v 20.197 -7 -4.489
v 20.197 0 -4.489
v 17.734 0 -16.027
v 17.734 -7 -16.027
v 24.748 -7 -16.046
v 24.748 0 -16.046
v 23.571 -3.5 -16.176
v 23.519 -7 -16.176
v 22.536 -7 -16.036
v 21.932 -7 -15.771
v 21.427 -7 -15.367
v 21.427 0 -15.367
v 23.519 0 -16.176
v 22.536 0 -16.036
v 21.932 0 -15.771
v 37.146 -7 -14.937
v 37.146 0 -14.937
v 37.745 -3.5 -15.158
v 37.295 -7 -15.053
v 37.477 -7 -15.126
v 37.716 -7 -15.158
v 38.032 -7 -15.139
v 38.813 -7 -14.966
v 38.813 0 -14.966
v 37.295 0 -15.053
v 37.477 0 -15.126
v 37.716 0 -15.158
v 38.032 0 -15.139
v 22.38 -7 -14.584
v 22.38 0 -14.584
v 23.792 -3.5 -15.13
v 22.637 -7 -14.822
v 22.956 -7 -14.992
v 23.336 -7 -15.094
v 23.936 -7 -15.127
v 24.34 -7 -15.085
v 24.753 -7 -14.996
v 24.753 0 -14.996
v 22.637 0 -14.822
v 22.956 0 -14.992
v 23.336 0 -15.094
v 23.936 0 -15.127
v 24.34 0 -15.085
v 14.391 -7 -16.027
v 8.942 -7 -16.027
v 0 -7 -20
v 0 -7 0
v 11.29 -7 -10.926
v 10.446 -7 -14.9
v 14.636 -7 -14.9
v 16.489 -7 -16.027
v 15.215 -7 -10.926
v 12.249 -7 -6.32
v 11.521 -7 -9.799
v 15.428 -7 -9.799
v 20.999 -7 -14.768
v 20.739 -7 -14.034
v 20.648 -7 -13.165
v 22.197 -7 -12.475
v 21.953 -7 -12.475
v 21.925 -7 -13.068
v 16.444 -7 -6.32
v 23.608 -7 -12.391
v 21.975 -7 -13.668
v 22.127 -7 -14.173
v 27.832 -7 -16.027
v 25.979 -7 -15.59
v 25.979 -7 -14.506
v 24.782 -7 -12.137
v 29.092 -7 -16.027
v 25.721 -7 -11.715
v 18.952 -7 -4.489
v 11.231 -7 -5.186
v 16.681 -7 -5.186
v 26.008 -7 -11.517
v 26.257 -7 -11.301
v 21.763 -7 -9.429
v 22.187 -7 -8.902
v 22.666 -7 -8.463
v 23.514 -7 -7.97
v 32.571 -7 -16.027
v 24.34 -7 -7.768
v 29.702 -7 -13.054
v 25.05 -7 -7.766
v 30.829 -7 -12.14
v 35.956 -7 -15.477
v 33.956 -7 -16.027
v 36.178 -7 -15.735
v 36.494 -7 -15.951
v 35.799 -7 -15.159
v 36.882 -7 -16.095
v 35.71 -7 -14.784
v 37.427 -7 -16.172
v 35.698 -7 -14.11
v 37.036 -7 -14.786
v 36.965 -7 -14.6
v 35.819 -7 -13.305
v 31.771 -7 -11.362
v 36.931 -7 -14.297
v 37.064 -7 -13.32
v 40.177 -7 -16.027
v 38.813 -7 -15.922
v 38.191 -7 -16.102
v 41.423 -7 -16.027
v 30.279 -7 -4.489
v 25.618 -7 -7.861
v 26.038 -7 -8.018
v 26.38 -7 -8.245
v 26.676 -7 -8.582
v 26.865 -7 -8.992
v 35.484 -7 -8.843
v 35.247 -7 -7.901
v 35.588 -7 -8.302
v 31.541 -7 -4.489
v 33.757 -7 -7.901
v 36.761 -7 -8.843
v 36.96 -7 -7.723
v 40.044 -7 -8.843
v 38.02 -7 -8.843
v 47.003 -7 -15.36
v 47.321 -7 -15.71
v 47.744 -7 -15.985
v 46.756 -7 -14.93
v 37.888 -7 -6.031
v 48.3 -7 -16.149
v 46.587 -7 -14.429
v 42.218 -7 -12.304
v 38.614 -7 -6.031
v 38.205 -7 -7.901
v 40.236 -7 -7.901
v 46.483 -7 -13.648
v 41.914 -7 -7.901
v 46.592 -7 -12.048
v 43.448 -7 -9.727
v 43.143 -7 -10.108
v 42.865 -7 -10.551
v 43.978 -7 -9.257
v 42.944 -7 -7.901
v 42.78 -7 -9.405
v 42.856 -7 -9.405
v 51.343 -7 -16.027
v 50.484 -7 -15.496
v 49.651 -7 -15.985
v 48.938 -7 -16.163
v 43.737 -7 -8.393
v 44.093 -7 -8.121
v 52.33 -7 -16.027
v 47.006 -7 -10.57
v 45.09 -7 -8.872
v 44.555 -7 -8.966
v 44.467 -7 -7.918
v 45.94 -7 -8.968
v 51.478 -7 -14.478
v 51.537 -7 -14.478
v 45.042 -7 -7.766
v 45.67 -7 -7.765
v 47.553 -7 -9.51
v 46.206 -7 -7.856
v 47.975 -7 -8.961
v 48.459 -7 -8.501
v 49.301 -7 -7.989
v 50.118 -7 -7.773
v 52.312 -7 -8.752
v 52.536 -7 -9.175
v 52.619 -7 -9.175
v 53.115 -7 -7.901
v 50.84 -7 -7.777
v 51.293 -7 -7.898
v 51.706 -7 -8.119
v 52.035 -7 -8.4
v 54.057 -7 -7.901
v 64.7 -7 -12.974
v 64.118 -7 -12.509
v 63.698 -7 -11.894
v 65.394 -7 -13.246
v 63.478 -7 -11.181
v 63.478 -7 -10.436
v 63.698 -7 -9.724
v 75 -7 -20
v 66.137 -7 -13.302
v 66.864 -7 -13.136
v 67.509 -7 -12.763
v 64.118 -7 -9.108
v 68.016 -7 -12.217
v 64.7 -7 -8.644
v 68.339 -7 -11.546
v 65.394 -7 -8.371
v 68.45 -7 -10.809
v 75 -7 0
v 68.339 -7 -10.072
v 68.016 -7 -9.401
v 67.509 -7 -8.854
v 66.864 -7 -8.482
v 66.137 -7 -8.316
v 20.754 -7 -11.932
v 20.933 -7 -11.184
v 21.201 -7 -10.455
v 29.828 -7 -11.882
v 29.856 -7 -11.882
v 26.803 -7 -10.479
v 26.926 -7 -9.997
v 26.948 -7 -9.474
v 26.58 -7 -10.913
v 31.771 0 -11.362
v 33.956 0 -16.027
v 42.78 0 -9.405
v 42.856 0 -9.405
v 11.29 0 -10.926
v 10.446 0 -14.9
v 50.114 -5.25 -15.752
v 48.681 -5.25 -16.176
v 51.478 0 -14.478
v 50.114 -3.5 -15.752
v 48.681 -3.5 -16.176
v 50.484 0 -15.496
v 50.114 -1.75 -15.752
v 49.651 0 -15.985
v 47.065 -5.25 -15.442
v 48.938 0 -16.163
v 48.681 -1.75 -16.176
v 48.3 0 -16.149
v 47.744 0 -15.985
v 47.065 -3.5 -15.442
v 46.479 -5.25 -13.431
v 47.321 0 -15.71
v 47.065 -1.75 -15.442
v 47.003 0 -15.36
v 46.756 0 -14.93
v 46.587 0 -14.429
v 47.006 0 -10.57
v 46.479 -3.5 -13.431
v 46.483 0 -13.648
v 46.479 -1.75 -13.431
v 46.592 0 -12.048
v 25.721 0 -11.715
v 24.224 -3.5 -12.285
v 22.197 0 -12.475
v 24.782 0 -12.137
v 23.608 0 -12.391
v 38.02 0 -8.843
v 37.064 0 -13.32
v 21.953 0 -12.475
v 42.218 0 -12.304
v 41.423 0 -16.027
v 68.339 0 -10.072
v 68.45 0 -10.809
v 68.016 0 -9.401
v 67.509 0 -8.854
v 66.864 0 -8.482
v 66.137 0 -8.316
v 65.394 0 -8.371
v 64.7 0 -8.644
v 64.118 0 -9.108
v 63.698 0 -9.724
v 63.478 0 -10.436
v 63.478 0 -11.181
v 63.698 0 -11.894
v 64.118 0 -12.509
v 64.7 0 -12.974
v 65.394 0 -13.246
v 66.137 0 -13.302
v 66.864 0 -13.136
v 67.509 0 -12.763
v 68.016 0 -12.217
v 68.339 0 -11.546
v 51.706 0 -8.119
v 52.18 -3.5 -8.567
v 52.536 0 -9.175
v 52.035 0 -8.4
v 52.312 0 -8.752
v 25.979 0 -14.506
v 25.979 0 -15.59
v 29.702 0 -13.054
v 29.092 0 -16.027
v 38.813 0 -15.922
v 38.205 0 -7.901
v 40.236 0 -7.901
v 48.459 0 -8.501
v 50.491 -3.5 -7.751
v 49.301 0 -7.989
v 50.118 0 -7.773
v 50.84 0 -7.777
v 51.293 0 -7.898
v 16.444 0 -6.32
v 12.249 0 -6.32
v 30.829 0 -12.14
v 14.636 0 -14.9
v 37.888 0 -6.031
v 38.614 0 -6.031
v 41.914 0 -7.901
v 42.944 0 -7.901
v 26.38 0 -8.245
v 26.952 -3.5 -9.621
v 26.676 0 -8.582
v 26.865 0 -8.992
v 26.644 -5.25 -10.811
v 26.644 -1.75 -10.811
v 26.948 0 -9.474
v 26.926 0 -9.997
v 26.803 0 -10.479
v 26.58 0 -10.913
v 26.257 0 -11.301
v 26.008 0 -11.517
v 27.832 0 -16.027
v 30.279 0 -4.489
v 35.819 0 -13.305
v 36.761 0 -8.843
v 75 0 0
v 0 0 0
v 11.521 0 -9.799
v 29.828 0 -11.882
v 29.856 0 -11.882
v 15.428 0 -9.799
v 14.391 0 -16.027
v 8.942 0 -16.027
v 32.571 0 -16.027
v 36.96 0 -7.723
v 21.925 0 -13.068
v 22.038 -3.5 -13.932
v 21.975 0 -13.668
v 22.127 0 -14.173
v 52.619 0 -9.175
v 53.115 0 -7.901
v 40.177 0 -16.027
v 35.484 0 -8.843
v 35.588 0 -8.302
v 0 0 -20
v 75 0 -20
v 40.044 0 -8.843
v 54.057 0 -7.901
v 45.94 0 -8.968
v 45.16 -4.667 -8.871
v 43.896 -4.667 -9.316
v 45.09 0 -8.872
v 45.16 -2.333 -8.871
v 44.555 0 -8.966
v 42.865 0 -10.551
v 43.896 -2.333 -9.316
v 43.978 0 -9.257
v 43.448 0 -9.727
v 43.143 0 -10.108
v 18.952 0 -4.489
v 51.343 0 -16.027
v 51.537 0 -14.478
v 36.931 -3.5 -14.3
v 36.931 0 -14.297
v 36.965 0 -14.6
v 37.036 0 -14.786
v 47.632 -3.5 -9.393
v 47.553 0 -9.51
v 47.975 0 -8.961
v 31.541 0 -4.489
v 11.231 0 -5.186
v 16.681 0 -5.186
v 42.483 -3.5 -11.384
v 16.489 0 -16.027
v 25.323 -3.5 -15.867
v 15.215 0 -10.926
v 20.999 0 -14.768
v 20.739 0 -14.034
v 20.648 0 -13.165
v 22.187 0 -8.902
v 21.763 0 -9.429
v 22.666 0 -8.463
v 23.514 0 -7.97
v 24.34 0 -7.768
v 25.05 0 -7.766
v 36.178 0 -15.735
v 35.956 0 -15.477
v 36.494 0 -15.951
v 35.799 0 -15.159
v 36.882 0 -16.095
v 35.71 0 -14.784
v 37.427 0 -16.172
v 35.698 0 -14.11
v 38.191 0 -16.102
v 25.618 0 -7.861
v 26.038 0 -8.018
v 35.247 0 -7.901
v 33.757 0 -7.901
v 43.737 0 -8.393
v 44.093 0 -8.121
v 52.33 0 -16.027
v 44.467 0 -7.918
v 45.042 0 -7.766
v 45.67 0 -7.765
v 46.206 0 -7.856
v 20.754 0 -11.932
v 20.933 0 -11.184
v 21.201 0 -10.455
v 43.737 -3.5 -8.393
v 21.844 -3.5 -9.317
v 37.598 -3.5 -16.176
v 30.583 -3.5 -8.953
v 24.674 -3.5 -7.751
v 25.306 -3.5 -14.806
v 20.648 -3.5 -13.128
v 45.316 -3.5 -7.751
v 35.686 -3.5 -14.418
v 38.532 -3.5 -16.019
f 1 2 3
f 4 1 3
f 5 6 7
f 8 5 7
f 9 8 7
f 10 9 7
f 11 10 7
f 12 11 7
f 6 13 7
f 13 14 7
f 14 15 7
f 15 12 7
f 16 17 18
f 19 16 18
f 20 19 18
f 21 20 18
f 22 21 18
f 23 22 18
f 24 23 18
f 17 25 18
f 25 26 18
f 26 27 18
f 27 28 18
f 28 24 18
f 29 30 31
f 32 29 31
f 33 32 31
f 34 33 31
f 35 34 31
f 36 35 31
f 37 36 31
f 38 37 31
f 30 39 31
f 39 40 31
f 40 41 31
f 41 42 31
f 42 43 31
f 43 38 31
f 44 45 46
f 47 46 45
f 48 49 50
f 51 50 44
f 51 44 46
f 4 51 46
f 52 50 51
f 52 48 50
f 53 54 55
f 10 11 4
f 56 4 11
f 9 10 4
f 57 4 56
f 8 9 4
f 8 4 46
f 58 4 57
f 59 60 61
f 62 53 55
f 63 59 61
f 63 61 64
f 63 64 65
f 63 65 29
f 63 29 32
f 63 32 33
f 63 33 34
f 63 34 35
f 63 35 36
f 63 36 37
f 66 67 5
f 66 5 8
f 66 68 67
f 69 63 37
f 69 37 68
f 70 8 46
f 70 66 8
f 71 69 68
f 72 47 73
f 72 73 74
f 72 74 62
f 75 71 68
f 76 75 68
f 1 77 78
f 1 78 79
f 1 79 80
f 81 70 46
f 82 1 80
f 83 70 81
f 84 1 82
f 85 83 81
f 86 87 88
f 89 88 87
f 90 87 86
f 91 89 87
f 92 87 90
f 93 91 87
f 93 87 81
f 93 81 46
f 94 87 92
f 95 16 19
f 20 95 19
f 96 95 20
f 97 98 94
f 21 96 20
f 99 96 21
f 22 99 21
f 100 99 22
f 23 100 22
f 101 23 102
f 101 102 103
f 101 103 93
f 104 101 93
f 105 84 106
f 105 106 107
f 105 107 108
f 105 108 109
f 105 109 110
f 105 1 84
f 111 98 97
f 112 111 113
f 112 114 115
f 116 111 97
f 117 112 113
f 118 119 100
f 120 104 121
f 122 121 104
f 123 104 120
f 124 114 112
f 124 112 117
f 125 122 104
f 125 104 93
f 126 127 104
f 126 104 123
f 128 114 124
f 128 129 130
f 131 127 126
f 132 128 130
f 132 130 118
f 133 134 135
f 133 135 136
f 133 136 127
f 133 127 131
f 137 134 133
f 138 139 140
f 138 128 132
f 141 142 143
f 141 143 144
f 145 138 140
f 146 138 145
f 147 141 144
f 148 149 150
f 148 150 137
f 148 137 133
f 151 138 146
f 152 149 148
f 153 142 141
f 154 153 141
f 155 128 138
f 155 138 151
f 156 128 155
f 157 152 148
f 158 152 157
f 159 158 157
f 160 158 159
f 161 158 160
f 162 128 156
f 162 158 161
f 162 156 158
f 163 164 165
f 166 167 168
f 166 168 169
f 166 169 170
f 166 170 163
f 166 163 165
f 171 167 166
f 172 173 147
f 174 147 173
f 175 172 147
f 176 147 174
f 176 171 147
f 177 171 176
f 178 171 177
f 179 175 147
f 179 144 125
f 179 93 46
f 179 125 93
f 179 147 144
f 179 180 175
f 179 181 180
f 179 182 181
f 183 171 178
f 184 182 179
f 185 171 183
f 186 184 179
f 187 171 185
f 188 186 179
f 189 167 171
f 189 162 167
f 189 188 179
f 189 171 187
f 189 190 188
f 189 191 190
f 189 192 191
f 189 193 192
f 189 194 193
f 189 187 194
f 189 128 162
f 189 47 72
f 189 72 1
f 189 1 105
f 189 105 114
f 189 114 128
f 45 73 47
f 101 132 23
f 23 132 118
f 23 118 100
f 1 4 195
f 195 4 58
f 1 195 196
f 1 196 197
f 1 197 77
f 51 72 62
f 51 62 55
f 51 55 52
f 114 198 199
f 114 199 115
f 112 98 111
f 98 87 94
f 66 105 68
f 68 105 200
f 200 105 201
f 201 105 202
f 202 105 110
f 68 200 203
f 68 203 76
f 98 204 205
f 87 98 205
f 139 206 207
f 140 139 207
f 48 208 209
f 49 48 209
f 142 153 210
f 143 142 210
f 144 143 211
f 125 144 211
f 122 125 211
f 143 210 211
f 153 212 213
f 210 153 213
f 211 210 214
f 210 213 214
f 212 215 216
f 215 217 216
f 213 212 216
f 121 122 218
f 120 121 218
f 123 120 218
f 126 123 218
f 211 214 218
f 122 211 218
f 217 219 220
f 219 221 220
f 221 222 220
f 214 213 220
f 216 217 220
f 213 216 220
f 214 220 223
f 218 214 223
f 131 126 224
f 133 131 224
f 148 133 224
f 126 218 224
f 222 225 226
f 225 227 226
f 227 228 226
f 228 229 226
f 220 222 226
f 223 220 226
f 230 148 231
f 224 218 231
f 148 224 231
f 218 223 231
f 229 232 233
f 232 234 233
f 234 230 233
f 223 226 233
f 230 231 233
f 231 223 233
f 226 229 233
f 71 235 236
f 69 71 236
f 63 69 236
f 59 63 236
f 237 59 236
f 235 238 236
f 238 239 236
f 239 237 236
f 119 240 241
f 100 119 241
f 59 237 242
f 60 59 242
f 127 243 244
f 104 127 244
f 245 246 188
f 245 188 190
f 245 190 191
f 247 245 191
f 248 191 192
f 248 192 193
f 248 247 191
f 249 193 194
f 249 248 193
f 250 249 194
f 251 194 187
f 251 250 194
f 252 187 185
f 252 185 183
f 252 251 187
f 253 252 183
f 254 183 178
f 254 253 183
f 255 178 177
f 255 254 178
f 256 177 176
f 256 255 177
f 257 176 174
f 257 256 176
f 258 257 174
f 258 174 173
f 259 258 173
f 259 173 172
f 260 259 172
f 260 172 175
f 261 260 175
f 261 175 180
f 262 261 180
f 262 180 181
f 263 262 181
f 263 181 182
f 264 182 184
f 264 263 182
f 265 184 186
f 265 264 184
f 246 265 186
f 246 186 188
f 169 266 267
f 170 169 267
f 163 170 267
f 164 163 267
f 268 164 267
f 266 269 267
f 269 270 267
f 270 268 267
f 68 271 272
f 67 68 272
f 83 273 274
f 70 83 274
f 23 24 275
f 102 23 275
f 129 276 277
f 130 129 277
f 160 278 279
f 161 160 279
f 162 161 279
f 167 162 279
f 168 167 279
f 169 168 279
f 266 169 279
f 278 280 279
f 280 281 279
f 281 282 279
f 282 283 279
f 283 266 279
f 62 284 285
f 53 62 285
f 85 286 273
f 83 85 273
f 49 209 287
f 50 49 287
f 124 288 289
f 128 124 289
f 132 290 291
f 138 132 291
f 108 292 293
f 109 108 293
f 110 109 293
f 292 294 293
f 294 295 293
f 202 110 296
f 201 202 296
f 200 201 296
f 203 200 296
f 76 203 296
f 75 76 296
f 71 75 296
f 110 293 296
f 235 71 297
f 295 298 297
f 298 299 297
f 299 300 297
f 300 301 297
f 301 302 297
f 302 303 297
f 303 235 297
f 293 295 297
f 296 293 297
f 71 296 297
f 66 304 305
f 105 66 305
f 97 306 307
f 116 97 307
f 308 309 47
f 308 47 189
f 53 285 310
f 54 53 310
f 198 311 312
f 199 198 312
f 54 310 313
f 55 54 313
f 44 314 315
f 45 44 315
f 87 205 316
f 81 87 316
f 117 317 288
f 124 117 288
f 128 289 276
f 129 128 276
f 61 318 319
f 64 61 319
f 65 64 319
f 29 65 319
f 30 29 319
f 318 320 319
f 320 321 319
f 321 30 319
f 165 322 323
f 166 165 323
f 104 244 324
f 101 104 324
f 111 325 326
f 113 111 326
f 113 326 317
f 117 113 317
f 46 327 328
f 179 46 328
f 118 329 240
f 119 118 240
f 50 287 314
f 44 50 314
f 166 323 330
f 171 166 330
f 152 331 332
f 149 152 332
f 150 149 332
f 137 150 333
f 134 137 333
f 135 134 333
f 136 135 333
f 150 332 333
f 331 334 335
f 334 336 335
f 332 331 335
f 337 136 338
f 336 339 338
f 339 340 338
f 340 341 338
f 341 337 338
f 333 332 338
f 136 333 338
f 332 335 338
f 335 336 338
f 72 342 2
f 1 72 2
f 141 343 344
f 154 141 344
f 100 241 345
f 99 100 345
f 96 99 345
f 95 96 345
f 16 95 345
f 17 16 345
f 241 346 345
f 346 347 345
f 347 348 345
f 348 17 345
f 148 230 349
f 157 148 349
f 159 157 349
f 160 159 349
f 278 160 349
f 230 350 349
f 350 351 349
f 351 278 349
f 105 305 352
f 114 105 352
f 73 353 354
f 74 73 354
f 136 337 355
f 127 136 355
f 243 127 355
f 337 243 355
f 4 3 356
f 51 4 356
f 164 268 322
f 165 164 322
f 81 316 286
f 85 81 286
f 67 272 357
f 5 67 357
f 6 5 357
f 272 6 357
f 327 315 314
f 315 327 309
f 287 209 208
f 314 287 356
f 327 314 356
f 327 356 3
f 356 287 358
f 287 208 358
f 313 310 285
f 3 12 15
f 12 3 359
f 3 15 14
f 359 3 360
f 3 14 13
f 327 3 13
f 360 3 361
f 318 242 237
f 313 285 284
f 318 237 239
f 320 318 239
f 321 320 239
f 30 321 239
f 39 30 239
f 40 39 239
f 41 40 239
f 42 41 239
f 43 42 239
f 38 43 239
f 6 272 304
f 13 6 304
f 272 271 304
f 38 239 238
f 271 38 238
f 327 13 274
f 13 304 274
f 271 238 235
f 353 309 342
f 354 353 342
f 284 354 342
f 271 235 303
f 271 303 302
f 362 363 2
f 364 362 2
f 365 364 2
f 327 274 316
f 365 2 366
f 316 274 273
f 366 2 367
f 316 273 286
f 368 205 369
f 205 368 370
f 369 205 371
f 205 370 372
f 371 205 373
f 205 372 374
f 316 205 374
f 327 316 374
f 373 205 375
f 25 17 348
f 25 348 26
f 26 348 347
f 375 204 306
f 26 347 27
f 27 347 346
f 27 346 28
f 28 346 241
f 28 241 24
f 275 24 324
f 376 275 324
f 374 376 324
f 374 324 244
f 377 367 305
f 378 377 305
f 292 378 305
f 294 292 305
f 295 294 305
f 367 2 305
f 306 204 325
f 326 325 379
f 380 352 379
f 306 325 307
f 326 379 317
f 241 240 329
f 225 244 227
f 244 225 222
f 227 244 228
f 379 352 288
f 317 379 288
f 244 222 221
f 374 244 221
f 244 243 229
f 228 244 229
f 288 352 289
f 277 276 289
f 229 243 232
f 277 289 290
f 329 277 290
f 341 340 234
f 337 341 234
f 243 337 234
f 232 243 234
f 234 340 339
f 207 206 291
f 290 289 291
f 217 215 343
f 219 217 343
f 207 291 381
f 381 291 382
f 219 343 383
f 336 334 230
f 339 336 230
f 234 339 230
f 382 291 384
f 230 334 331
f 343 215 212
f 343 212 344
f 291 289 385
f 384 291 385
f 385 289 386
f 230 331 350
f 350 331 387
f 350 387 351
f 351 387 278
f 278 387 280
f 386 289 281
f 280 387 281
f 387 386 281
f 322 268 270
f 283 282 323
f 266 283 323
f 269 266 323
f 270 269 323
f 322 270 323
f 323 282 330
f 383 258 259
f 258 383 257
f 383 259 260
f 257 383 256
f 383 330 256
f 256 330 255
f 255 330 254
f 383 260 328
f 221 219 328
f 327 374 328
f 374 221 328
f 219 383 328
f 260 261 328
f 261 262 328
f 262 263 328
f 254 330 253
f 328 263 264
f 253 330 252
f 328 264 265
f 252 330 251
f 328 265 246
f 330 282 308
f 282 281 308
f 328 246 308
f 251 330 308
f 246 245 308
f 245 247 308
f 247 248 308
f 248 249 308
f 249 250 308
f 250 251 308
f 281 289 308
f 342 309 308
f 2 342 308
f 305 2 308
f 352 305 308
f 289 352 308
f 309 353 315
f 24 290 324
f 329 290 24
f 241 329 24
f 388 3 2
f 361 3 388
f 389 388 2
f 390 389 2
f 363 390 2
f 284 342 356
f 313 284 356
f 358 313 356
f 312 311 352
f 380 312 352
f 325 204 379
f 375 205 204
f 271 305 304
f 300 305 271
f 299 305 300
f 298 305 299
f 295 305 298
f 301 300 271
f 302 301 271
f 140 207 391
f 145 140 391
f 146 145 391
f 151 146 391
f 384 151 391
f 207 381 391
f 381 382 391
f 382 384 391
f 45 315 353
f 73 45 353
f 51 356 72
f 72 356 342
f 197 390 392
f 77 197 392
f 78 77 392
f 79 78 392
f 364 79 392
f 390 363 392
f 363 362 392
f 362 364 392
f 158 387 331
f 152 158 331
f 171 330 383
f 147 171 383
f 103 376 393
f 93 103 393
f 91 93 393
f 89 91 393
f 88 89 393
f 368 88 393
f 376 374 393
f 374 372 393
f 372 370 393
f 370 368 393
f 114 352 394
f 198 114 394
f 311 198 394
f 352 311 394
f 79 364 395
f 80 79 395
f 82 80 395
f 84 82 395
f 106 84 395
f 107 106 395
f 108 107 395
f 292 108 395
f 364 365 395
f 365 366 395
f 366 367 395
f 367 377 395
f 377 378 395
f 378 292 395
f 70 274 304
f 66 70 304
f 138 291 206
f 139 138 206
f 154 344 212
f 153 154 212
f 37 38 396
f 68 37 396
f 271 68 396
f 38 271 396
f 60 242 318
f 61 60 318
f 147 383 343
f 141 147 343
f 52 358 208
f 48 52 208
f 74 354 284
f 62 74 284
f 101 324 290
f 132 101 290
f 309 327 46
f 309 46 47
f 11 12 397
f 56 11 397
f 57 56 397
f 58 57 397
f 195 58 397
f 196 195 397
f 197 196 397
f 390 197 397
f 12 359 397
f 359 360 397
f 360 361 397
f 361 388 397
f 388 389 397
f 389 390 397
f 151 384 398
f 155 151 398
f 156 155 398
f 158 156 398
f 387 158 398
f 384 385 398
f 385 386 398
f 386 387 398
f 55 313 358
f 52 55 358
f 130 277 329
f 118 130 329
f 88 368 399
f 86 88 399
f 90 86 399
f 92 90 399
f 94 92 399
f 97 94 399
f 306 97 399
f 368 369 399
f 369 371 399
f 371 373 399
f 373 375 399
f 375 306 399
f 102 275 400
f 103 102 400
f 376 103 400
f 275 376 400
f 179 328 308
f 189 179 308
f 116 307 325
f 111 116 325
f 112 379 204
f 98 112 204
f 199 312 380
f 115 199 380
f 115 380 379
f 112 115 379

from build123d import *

# Parameters (mm, degrees)
F0_W     = 75
F0_H     = 20
F0_R     = 2.5
F1_DEPTH = 7


with BuildPart() as f1:
    # F0 (on Front) → F1 (new body)
    with BuildSketch(Plane.XZ):
        with Locations((37.5, -10)):
            Rectangle(F0_W, F0_H)
        Polygon((14.6358500468, -14.8998533473), (14.3914699527, -16.0268489271), (8.941556591, -16.0268489271), (11.2311370847, -5.1863377606), (16.6810504464, -5.1863377606), (16.4437882191, -6.3204512072), (12.2489920399, -6.3204512072), (11.520597002, -9.7987154598), (15.4283058861, -9.7987154598), (15.2147698815, -10.9257110396), (11.2904526415, -10.9257110396), (10.4457991123, -14.8998533473), align=None, mode=Mode.SUBTRACT)
        Polygon((20.1972766554, -4.4887868122), (17.7344947357, -16.0268489271), (16.4888680423, -16.0268489271), (18.9516499619, -4.4887868122), align=None, mode=Mode.SUBTRACT)
        with BuildLine():
            add(Edge.make_bspline(
                [(24.7479661755, -16.0458299053), (24.214126164, -16.1763241304), (23.571145528, -16.1763241304)],
                knots=[0, 0, 0, 1, 1, 1], degree=2))
            add(Edge.make_bspline(
                [(23.571145528, -16.1763241304), (22.2068877208, -16.1763241304), (21.4274813041, -15.3672599352)],
                knots=[0, 0, 0, 1, 1, 1], degree=2))
            add(Edge.make_bspline(
                [(21.4274813041, -15.3672599352), (20.6480748873, -14.55819574), (20.6480748873, -13.1275045092)],
                knots=[0, 0, 0, 1, 1, 1], degree=2))
            add(Edge.make_bspline(
                [(20.6480748873, -13.1275045092), (20.6480748873, -11.7347752348), (21.200895877, -10.4547455184)],
                knots=[0, 0, 0, 1, 1, 1], degree=2))
            add(Edge.make_bspline(
                [(21.200895877, -10.4547455184), (21.7537168666, -9.1747158019), (22.6659901307, -8.46292912)],
                knots=[0, 0, 0, 1, 1, 1], degree=2))
            add(Edge.make_bspline(
                [(22.6659901307, -8.46292912), (23.5782633948, -7.751142438), (24.674414885, -7.751142438)],
                knots=[0, 0, 0, 1, 1, 1], degree=2))
            add(Edge.make_bspline(
                [(24.674414885, -7.751142438), (25.8085283317, -7.751142438), (26.3803302995, -8.2446478708)],
                knots=[0, 0, 0, 1, 1, 1], degree=2))
            add(Edge.make_bspline(
                [(26.3803302995, -8.2446478708), (26.9521322674, -8.7381533037), (26.9521322674, -9.6207687893)],
                knots=[0, 0, 0, 1, 1, 1], degree=2))
            add(Edge.make_bspline(
                [(26.9521322674, -9.6207687893), (26.9521322674, -10.9541825069), (25.7207413075, -11.7146079455)],
                knots=[0, 0, 0, 1, 1, 1], degree=2))
            add(Edge.make_bspline(
                [(25.7207413075, -11.7146079455), (24.4893503477, -12.4750333841), (22.1973972317, -12.4750333841)],
                knots=[0, 0, 0, 1, 1, 1], degree=2))
            Line((22.1973972317, -12.4750333841), (21.9530171376, -12.4750333841))
            Line((21.9530171376, -12.4750333841), (21.9245456703, -13.0681889524))
            add(Edge.make_bspline(
                [(21.9245456703, -13.0681889524), (21.9245456703, -14.0385914621), (22.3800891468, -14.584294585)],
                knots=[0, 0, 0, 1, 1, 1], degree=2))
            add(Edge.make_bspline(
                [(22.3800891468, -14.584294585), (22.8356326233, -15.1299977078), (23.7917993994, -15.1299977078)],
                knots=[0, 0, 0, 1, 1, 1], degree=2))
            add(Edge.make_bspline(
                [(23.7917993994, -15.1299977078), (24.2592059872, -15.1299977078), (24.7527114201, -14.9959445494)],
                knots=[0, 0, 0, 1, 1, 1], degree=2))
            add(Edge.make_bspline(
                [(24.7527114201, -14.9959445494), (25.2462168529, -14.861891391), (25.9793571353, -14.50599805)],
                knots=[0, 0, 0, 1, 1, 1], degree=2))
            Line((25.9793571353, -14.50599805), (25.9793571353, -15.5902864289))
            add(Edge.make_bspline(
                [(25.9793571353, -15.5902864289), (25.281806187, -15.9153356803), (24.7479661755, -16.0458299053)],
                knots=[0, 0, 0, 1, 1, 1], degree=2))
        make_face(mode=Mode.SUBTRACT)
        with BuildLine():
            Line((29.8277504626, -11.8818778157), (29.8562219299, -11.8818778157))
            Line((29.8562219299, -11.8818778157), (33.7568129471, -7.9006176412))
            Line((33.7568129471, -7.9006176412), (35.2468197347, -7.9006176412))
            Line((35.2468197347, -7.9006176412), (31.7709281044, -11.3622735379))
            Line((31.7709281044, -11.3622735379), (33.9561132181, -16.0268489271))
            Line((33.9561132181, -16.0268489271), (32.5705018105, -16.0268489271))
            Line((32.5705018105, -16.0268489271), (30.8289970619, -12.1404936435))
            Line((30.8289970619, -12.1404936435), (29.7020014821, -13.0539532187))
            Line((29.7020014821, -13.0539532187), (29.0922375579, -16.0268489271))
            Line((29.0922375579, -16.0268489271), (27.8323751308, -16.0268489271))
            Line((27.8323751308, -16.0268489271), (30.2785486945, -4.4887868122))
            Line((30.2785486945, -4.4887868122), (31.5407837439, -4.4887868122))
            add(Edge.make_bspline(
                [(31.5407837439, -4.4887868122), (31.0069437324, -6.9800401992), (30.5834306566, -8.9528756194)],
                knots=[0, 0, 0, 1, 1, 1], degree=2))
            add(Edge.make_bspline(
                [(30.5834306566, -8.9528756194), (30.1599175808, -10.9257110396), (29.8277504626, -11.8818778157)],
                knots=[0, 0, 0, 1, 1, 1], degree=2))
        make_face(mode=Mode.SUBTRACT)
        with BuildLine():
            add(Edge.make_bspline(
                [(44.4668298886, -7.9184123082), (44.8488220746, -7.751142438), (45.3162286625, -7.751142438)],
                knots=[0, 0, 0, 1, 1, 1], degree=2))
            add(Edge.make_bspline(
                [(45.3162286625, -7.751142438), (45.8287150735, -7.751142438), (46.2059620149, -7.855537818)],
                knots=[0, 0, 0, 1, 1, 1], degree=2))
            Line((46.2059620149, -7.855537818), (45.9402283203, -8.9682976642))
            add(Edge.make_bspline(
                [(45.9402283203, -8.9682976642), (45.546373023, -8.871020151), (45.1596355924, -8.871020151)],
                knots=[0, 0, 0, 1, 1, 1], degree=2))
            add(Edge.make_bspline(
                [(45.1596355924, -8.871020151), (44.4858108668, -8.871020151), (43.8962142319, -9.3158868272)],
                knots=[0, 0, 0, 1, 1, 1], degree=2))
            add(Edge.make_bspline(
                [(43.8962142319, -9.3158868272), (43.306617597, -9.7607535034), (42.8653098542, -10.5508367204)],
                knots=[0, 0, 0, 1, 1, 1], degree=2))
            add(Edge.make_bspline(
                [(42.8653098542, -10.5508367204), (42.4240021113, -11.3409199374), (42.2175839736, -12.3042045804)],
                knots=[0, 0, 0, 1, 1, 1], degree=2))
            Line((42.2175839736, -12.3042045804), (41.422755512, -16.0268489271))
            Line((41.422755512, -16.0268489271), (40.1771288186, -16.0268489271))
            Line((40.1771288186, -16.0268489271), (41.9138883226, -7.9006176412))
            Line((41.9138883226, -7.9006176412), (42.9436063892, -7.9006176412))
            Line((42.9436063892, -7.9006176412), (42.7798954523, -9.4048601625))
            Line((42.7798954523, -9.4048601625), (42.8558193651, -9.4048601625))
            add(Edge.make_bspline(
                [(42.8558193651, -9.4048601625), (43.3896593766, -8.7001913473), (43.7372485396, -8.3929367629)],
                knots=[0, 0, 0, 1, 1, 1], degree=2))
            add(Edge.make_bspline(
                [(43.7372485396, -8.3929367629), (44.0848377026, -8.0856821785), (44.4668298886, -7.9184123082)],
                knots=[0, 0, 0, 1, 1, 1], degree=2))
        make_face(mode=Mode.SUBTRACT)
        with BuildLine():
            add(Edge.make_bspline(
                [(37.1461038645, -14.9366289926), (37.3608261802, -15.1584691751), (37.7451909885, -15.1584691751)],
                knots=[0, 0, 0, 1, 1, 1], degree=2))
            add(Edge.make_bspline(
                [(37.7451909885, -15.1584691751), (38.1532820195, -15.1584691751), (38.8128710114, -14.966286771)],
                knots=[0, 0, 0, 1, 1, 1], degree=2))
            Line((38.8128710114, -14.966286771), (38.8128710114, -15.9224535471))
            add(Edge.make_bspline(
                [(38.8128710114, -15.9224535471), (38.5613730505, -16.0268489271), (38.1912439758, -16.1015865287)],
                knots=[0, 0, 0, 1, 1, 1], degree=2))
            add(Edge.make_bspline(
                [(38.1912439758, -16.1015865287), (37.8211149012, -16.1763241304), (37.5980884075, -16.1763241304)],
                knots=[0, 0, 0, 1, 1, 1], degree=2))
            add(Edge.make_bspline(
                [(37.5980884075, -16.1763241304), (36.6703930987, -16.1763241304), (36.178073977, -15.7350163875)],
                knots=[0, 0, 0, 1, 1, 1], degree=2))
            add(Edge.make_bspline(
                [(36.178073977, -15.7350163875), (35.6857548553, -15.2937086447), (35.6857548553, -14.4182110259)],
                knots=[0, 0, 0, 1, 1, 1], degree=2))
            add(Edge.make_bspline(
                [(35.6857548553, -14.4182110259), (35.6857548553, -13.9294508376), (35.8186217026, -13.3054511797)],
                knots=[0, 0, 0, 1, 1, 1], degree=2))
            Line((35.8186217026, -13.3054511797), (36.7605527451, -8.8425486837))
            Line((36.7605527451, -8.8425486837), (35.484081962, -8.8425486837))
            Line((35.484081962, -8.8425486837), (35.5884773421, -8.3015908054))
            Line((35.5884773421, -8.3015908054), (36.959853016, -7.7226709707))
            Line((36.959853016, -7.7226709707), (37.8875483249, -6.0309912899))
            Line((37.8875483249, -6.0309912899), (38.6135707405, -6.0309912899))
            Line((38.6135707405, -6.0309912899), (38.2054797095, -7.9006176412))
            Line((38.2054797095, -7.9006176412), (40.2364443754, -7.9006176412))
            Line((40.2364443754, -7.9006176412), (40.0442619713, -8.8425486837))
            Line((40.0442619713, -8.8425486837), (38.0204151722, -8.8425486837))
            Line((38.0204151722, -8.8425486837), (37.064248396, -13.3196869133))
            add(Edge.make_bspline(
                [(37.064248396, -13.3196869133), (36.9313815487, -13.9650401717), (36.9313815487, -14.2995799122)],
                knots=[0, 0, 0, 1, 1, 1], degree=2))
            add(Edge.make_bspline(
                [(36.9313815487, -14.2995799122), (36.9313815487, -14.71478881), (37.1461038645, -14.9366289926)],
                knots=[0, 0, 0, 1, 1, 1], degree=2))
        make_face(mode=Mode.SUBTRACT)
        with BuildLine():
            add(Edge.make_bspline(
                [(48.4587668634, -8.5008910763), (49.3852758611, -7.751142438), (50.4909178405, -7.751142438)],
                knots=[0, 0, 0, 1, 1, 1], degree=2))
            add(Edge.make_bspline(
                [(50.4909178405, -7.751142438), (51.1718604329, -7.751142438), (51.7057004444, -8.1188988903)],
                knots=[0, 0, 0, 1, 1, 1], degree=2))
            add(Edge.make_bspline(
                [(51.7057004444, -8.1188988903), (52.2395404559, -8.4866553427), (52.53611824, -9.1747158019)],
                knots=[0, 0, 0, 1, 1, 1], degree=2))
            Line((52.53611824, -9.1747158019), (52.6191600196, -9.1747158019))
            Line((52.6191600196, -9.1747158019), (53.1150380747, -7.9006176412))
            Line((53.1150380747, -7.9006176412), (54.0569691172, -7.9006176412))
            Line((54.0569691172, -7.9006176412), (52.3297001022, -16.0268489271))
            Line((52.3297001022, -16.0268489271), (51.3426892366, -16.0268489271))
            Line((51.3426892366, -16.0268489271), (51.537244263, -14.4775265827))
            Line((51.537244263, -14.4775265827), (51.4779287061, -14.4775265827))
            add(Edge.make_bspline(
                [(51.4779287061, -14.4775265827), (50.1492602331, -16.1763241304), (48.680607046, -16.1763241304)],
                knots=[0, 0, 0, 1, 1, 1], degree=2))
            add(Edge.make_bspline(
                [(48.680607046, -16.1763241304), (47.6508889794, -16.1763241304), (47.0648512779, -15.4419975368)],
                knots=[0, 0, 0, 1, 1, 1], degree=2))
            add(Edge.make_bspline(
                [(47.0648512779, -15.4419975368), (46.4788135764, -14.7076709432), (46.4788135764, -13.4312001602)],
                knots=[0, 0, 0, 1, 1, 1], degree=2))
            add(Edge.make_bspline(
                [(46.4788135764, -13.4312001602), (46.4788135764, -11.8889956826), (47.005535721, -10.5698176986)],
                knots=[0, 0, 0, 1, 1, 1], degree=2))
            add(Edge.make_bspline(
                [(47.005535721, -10.5698176986), (47.5322578657, -9.2506397147), (48.4587668634, -8.5008910763)],
                knots=[0, 0, 0, 1, 1, 1], degree=2))
        make_face(mode=Mode.SUBTRACT)
        with Locations((65.950281918, -10.8088040724)):
            Circle(F0_R, mode=Mode.SUBTRACT)
    extrude(amount=F1_DEPTH)


solid = f1.part
